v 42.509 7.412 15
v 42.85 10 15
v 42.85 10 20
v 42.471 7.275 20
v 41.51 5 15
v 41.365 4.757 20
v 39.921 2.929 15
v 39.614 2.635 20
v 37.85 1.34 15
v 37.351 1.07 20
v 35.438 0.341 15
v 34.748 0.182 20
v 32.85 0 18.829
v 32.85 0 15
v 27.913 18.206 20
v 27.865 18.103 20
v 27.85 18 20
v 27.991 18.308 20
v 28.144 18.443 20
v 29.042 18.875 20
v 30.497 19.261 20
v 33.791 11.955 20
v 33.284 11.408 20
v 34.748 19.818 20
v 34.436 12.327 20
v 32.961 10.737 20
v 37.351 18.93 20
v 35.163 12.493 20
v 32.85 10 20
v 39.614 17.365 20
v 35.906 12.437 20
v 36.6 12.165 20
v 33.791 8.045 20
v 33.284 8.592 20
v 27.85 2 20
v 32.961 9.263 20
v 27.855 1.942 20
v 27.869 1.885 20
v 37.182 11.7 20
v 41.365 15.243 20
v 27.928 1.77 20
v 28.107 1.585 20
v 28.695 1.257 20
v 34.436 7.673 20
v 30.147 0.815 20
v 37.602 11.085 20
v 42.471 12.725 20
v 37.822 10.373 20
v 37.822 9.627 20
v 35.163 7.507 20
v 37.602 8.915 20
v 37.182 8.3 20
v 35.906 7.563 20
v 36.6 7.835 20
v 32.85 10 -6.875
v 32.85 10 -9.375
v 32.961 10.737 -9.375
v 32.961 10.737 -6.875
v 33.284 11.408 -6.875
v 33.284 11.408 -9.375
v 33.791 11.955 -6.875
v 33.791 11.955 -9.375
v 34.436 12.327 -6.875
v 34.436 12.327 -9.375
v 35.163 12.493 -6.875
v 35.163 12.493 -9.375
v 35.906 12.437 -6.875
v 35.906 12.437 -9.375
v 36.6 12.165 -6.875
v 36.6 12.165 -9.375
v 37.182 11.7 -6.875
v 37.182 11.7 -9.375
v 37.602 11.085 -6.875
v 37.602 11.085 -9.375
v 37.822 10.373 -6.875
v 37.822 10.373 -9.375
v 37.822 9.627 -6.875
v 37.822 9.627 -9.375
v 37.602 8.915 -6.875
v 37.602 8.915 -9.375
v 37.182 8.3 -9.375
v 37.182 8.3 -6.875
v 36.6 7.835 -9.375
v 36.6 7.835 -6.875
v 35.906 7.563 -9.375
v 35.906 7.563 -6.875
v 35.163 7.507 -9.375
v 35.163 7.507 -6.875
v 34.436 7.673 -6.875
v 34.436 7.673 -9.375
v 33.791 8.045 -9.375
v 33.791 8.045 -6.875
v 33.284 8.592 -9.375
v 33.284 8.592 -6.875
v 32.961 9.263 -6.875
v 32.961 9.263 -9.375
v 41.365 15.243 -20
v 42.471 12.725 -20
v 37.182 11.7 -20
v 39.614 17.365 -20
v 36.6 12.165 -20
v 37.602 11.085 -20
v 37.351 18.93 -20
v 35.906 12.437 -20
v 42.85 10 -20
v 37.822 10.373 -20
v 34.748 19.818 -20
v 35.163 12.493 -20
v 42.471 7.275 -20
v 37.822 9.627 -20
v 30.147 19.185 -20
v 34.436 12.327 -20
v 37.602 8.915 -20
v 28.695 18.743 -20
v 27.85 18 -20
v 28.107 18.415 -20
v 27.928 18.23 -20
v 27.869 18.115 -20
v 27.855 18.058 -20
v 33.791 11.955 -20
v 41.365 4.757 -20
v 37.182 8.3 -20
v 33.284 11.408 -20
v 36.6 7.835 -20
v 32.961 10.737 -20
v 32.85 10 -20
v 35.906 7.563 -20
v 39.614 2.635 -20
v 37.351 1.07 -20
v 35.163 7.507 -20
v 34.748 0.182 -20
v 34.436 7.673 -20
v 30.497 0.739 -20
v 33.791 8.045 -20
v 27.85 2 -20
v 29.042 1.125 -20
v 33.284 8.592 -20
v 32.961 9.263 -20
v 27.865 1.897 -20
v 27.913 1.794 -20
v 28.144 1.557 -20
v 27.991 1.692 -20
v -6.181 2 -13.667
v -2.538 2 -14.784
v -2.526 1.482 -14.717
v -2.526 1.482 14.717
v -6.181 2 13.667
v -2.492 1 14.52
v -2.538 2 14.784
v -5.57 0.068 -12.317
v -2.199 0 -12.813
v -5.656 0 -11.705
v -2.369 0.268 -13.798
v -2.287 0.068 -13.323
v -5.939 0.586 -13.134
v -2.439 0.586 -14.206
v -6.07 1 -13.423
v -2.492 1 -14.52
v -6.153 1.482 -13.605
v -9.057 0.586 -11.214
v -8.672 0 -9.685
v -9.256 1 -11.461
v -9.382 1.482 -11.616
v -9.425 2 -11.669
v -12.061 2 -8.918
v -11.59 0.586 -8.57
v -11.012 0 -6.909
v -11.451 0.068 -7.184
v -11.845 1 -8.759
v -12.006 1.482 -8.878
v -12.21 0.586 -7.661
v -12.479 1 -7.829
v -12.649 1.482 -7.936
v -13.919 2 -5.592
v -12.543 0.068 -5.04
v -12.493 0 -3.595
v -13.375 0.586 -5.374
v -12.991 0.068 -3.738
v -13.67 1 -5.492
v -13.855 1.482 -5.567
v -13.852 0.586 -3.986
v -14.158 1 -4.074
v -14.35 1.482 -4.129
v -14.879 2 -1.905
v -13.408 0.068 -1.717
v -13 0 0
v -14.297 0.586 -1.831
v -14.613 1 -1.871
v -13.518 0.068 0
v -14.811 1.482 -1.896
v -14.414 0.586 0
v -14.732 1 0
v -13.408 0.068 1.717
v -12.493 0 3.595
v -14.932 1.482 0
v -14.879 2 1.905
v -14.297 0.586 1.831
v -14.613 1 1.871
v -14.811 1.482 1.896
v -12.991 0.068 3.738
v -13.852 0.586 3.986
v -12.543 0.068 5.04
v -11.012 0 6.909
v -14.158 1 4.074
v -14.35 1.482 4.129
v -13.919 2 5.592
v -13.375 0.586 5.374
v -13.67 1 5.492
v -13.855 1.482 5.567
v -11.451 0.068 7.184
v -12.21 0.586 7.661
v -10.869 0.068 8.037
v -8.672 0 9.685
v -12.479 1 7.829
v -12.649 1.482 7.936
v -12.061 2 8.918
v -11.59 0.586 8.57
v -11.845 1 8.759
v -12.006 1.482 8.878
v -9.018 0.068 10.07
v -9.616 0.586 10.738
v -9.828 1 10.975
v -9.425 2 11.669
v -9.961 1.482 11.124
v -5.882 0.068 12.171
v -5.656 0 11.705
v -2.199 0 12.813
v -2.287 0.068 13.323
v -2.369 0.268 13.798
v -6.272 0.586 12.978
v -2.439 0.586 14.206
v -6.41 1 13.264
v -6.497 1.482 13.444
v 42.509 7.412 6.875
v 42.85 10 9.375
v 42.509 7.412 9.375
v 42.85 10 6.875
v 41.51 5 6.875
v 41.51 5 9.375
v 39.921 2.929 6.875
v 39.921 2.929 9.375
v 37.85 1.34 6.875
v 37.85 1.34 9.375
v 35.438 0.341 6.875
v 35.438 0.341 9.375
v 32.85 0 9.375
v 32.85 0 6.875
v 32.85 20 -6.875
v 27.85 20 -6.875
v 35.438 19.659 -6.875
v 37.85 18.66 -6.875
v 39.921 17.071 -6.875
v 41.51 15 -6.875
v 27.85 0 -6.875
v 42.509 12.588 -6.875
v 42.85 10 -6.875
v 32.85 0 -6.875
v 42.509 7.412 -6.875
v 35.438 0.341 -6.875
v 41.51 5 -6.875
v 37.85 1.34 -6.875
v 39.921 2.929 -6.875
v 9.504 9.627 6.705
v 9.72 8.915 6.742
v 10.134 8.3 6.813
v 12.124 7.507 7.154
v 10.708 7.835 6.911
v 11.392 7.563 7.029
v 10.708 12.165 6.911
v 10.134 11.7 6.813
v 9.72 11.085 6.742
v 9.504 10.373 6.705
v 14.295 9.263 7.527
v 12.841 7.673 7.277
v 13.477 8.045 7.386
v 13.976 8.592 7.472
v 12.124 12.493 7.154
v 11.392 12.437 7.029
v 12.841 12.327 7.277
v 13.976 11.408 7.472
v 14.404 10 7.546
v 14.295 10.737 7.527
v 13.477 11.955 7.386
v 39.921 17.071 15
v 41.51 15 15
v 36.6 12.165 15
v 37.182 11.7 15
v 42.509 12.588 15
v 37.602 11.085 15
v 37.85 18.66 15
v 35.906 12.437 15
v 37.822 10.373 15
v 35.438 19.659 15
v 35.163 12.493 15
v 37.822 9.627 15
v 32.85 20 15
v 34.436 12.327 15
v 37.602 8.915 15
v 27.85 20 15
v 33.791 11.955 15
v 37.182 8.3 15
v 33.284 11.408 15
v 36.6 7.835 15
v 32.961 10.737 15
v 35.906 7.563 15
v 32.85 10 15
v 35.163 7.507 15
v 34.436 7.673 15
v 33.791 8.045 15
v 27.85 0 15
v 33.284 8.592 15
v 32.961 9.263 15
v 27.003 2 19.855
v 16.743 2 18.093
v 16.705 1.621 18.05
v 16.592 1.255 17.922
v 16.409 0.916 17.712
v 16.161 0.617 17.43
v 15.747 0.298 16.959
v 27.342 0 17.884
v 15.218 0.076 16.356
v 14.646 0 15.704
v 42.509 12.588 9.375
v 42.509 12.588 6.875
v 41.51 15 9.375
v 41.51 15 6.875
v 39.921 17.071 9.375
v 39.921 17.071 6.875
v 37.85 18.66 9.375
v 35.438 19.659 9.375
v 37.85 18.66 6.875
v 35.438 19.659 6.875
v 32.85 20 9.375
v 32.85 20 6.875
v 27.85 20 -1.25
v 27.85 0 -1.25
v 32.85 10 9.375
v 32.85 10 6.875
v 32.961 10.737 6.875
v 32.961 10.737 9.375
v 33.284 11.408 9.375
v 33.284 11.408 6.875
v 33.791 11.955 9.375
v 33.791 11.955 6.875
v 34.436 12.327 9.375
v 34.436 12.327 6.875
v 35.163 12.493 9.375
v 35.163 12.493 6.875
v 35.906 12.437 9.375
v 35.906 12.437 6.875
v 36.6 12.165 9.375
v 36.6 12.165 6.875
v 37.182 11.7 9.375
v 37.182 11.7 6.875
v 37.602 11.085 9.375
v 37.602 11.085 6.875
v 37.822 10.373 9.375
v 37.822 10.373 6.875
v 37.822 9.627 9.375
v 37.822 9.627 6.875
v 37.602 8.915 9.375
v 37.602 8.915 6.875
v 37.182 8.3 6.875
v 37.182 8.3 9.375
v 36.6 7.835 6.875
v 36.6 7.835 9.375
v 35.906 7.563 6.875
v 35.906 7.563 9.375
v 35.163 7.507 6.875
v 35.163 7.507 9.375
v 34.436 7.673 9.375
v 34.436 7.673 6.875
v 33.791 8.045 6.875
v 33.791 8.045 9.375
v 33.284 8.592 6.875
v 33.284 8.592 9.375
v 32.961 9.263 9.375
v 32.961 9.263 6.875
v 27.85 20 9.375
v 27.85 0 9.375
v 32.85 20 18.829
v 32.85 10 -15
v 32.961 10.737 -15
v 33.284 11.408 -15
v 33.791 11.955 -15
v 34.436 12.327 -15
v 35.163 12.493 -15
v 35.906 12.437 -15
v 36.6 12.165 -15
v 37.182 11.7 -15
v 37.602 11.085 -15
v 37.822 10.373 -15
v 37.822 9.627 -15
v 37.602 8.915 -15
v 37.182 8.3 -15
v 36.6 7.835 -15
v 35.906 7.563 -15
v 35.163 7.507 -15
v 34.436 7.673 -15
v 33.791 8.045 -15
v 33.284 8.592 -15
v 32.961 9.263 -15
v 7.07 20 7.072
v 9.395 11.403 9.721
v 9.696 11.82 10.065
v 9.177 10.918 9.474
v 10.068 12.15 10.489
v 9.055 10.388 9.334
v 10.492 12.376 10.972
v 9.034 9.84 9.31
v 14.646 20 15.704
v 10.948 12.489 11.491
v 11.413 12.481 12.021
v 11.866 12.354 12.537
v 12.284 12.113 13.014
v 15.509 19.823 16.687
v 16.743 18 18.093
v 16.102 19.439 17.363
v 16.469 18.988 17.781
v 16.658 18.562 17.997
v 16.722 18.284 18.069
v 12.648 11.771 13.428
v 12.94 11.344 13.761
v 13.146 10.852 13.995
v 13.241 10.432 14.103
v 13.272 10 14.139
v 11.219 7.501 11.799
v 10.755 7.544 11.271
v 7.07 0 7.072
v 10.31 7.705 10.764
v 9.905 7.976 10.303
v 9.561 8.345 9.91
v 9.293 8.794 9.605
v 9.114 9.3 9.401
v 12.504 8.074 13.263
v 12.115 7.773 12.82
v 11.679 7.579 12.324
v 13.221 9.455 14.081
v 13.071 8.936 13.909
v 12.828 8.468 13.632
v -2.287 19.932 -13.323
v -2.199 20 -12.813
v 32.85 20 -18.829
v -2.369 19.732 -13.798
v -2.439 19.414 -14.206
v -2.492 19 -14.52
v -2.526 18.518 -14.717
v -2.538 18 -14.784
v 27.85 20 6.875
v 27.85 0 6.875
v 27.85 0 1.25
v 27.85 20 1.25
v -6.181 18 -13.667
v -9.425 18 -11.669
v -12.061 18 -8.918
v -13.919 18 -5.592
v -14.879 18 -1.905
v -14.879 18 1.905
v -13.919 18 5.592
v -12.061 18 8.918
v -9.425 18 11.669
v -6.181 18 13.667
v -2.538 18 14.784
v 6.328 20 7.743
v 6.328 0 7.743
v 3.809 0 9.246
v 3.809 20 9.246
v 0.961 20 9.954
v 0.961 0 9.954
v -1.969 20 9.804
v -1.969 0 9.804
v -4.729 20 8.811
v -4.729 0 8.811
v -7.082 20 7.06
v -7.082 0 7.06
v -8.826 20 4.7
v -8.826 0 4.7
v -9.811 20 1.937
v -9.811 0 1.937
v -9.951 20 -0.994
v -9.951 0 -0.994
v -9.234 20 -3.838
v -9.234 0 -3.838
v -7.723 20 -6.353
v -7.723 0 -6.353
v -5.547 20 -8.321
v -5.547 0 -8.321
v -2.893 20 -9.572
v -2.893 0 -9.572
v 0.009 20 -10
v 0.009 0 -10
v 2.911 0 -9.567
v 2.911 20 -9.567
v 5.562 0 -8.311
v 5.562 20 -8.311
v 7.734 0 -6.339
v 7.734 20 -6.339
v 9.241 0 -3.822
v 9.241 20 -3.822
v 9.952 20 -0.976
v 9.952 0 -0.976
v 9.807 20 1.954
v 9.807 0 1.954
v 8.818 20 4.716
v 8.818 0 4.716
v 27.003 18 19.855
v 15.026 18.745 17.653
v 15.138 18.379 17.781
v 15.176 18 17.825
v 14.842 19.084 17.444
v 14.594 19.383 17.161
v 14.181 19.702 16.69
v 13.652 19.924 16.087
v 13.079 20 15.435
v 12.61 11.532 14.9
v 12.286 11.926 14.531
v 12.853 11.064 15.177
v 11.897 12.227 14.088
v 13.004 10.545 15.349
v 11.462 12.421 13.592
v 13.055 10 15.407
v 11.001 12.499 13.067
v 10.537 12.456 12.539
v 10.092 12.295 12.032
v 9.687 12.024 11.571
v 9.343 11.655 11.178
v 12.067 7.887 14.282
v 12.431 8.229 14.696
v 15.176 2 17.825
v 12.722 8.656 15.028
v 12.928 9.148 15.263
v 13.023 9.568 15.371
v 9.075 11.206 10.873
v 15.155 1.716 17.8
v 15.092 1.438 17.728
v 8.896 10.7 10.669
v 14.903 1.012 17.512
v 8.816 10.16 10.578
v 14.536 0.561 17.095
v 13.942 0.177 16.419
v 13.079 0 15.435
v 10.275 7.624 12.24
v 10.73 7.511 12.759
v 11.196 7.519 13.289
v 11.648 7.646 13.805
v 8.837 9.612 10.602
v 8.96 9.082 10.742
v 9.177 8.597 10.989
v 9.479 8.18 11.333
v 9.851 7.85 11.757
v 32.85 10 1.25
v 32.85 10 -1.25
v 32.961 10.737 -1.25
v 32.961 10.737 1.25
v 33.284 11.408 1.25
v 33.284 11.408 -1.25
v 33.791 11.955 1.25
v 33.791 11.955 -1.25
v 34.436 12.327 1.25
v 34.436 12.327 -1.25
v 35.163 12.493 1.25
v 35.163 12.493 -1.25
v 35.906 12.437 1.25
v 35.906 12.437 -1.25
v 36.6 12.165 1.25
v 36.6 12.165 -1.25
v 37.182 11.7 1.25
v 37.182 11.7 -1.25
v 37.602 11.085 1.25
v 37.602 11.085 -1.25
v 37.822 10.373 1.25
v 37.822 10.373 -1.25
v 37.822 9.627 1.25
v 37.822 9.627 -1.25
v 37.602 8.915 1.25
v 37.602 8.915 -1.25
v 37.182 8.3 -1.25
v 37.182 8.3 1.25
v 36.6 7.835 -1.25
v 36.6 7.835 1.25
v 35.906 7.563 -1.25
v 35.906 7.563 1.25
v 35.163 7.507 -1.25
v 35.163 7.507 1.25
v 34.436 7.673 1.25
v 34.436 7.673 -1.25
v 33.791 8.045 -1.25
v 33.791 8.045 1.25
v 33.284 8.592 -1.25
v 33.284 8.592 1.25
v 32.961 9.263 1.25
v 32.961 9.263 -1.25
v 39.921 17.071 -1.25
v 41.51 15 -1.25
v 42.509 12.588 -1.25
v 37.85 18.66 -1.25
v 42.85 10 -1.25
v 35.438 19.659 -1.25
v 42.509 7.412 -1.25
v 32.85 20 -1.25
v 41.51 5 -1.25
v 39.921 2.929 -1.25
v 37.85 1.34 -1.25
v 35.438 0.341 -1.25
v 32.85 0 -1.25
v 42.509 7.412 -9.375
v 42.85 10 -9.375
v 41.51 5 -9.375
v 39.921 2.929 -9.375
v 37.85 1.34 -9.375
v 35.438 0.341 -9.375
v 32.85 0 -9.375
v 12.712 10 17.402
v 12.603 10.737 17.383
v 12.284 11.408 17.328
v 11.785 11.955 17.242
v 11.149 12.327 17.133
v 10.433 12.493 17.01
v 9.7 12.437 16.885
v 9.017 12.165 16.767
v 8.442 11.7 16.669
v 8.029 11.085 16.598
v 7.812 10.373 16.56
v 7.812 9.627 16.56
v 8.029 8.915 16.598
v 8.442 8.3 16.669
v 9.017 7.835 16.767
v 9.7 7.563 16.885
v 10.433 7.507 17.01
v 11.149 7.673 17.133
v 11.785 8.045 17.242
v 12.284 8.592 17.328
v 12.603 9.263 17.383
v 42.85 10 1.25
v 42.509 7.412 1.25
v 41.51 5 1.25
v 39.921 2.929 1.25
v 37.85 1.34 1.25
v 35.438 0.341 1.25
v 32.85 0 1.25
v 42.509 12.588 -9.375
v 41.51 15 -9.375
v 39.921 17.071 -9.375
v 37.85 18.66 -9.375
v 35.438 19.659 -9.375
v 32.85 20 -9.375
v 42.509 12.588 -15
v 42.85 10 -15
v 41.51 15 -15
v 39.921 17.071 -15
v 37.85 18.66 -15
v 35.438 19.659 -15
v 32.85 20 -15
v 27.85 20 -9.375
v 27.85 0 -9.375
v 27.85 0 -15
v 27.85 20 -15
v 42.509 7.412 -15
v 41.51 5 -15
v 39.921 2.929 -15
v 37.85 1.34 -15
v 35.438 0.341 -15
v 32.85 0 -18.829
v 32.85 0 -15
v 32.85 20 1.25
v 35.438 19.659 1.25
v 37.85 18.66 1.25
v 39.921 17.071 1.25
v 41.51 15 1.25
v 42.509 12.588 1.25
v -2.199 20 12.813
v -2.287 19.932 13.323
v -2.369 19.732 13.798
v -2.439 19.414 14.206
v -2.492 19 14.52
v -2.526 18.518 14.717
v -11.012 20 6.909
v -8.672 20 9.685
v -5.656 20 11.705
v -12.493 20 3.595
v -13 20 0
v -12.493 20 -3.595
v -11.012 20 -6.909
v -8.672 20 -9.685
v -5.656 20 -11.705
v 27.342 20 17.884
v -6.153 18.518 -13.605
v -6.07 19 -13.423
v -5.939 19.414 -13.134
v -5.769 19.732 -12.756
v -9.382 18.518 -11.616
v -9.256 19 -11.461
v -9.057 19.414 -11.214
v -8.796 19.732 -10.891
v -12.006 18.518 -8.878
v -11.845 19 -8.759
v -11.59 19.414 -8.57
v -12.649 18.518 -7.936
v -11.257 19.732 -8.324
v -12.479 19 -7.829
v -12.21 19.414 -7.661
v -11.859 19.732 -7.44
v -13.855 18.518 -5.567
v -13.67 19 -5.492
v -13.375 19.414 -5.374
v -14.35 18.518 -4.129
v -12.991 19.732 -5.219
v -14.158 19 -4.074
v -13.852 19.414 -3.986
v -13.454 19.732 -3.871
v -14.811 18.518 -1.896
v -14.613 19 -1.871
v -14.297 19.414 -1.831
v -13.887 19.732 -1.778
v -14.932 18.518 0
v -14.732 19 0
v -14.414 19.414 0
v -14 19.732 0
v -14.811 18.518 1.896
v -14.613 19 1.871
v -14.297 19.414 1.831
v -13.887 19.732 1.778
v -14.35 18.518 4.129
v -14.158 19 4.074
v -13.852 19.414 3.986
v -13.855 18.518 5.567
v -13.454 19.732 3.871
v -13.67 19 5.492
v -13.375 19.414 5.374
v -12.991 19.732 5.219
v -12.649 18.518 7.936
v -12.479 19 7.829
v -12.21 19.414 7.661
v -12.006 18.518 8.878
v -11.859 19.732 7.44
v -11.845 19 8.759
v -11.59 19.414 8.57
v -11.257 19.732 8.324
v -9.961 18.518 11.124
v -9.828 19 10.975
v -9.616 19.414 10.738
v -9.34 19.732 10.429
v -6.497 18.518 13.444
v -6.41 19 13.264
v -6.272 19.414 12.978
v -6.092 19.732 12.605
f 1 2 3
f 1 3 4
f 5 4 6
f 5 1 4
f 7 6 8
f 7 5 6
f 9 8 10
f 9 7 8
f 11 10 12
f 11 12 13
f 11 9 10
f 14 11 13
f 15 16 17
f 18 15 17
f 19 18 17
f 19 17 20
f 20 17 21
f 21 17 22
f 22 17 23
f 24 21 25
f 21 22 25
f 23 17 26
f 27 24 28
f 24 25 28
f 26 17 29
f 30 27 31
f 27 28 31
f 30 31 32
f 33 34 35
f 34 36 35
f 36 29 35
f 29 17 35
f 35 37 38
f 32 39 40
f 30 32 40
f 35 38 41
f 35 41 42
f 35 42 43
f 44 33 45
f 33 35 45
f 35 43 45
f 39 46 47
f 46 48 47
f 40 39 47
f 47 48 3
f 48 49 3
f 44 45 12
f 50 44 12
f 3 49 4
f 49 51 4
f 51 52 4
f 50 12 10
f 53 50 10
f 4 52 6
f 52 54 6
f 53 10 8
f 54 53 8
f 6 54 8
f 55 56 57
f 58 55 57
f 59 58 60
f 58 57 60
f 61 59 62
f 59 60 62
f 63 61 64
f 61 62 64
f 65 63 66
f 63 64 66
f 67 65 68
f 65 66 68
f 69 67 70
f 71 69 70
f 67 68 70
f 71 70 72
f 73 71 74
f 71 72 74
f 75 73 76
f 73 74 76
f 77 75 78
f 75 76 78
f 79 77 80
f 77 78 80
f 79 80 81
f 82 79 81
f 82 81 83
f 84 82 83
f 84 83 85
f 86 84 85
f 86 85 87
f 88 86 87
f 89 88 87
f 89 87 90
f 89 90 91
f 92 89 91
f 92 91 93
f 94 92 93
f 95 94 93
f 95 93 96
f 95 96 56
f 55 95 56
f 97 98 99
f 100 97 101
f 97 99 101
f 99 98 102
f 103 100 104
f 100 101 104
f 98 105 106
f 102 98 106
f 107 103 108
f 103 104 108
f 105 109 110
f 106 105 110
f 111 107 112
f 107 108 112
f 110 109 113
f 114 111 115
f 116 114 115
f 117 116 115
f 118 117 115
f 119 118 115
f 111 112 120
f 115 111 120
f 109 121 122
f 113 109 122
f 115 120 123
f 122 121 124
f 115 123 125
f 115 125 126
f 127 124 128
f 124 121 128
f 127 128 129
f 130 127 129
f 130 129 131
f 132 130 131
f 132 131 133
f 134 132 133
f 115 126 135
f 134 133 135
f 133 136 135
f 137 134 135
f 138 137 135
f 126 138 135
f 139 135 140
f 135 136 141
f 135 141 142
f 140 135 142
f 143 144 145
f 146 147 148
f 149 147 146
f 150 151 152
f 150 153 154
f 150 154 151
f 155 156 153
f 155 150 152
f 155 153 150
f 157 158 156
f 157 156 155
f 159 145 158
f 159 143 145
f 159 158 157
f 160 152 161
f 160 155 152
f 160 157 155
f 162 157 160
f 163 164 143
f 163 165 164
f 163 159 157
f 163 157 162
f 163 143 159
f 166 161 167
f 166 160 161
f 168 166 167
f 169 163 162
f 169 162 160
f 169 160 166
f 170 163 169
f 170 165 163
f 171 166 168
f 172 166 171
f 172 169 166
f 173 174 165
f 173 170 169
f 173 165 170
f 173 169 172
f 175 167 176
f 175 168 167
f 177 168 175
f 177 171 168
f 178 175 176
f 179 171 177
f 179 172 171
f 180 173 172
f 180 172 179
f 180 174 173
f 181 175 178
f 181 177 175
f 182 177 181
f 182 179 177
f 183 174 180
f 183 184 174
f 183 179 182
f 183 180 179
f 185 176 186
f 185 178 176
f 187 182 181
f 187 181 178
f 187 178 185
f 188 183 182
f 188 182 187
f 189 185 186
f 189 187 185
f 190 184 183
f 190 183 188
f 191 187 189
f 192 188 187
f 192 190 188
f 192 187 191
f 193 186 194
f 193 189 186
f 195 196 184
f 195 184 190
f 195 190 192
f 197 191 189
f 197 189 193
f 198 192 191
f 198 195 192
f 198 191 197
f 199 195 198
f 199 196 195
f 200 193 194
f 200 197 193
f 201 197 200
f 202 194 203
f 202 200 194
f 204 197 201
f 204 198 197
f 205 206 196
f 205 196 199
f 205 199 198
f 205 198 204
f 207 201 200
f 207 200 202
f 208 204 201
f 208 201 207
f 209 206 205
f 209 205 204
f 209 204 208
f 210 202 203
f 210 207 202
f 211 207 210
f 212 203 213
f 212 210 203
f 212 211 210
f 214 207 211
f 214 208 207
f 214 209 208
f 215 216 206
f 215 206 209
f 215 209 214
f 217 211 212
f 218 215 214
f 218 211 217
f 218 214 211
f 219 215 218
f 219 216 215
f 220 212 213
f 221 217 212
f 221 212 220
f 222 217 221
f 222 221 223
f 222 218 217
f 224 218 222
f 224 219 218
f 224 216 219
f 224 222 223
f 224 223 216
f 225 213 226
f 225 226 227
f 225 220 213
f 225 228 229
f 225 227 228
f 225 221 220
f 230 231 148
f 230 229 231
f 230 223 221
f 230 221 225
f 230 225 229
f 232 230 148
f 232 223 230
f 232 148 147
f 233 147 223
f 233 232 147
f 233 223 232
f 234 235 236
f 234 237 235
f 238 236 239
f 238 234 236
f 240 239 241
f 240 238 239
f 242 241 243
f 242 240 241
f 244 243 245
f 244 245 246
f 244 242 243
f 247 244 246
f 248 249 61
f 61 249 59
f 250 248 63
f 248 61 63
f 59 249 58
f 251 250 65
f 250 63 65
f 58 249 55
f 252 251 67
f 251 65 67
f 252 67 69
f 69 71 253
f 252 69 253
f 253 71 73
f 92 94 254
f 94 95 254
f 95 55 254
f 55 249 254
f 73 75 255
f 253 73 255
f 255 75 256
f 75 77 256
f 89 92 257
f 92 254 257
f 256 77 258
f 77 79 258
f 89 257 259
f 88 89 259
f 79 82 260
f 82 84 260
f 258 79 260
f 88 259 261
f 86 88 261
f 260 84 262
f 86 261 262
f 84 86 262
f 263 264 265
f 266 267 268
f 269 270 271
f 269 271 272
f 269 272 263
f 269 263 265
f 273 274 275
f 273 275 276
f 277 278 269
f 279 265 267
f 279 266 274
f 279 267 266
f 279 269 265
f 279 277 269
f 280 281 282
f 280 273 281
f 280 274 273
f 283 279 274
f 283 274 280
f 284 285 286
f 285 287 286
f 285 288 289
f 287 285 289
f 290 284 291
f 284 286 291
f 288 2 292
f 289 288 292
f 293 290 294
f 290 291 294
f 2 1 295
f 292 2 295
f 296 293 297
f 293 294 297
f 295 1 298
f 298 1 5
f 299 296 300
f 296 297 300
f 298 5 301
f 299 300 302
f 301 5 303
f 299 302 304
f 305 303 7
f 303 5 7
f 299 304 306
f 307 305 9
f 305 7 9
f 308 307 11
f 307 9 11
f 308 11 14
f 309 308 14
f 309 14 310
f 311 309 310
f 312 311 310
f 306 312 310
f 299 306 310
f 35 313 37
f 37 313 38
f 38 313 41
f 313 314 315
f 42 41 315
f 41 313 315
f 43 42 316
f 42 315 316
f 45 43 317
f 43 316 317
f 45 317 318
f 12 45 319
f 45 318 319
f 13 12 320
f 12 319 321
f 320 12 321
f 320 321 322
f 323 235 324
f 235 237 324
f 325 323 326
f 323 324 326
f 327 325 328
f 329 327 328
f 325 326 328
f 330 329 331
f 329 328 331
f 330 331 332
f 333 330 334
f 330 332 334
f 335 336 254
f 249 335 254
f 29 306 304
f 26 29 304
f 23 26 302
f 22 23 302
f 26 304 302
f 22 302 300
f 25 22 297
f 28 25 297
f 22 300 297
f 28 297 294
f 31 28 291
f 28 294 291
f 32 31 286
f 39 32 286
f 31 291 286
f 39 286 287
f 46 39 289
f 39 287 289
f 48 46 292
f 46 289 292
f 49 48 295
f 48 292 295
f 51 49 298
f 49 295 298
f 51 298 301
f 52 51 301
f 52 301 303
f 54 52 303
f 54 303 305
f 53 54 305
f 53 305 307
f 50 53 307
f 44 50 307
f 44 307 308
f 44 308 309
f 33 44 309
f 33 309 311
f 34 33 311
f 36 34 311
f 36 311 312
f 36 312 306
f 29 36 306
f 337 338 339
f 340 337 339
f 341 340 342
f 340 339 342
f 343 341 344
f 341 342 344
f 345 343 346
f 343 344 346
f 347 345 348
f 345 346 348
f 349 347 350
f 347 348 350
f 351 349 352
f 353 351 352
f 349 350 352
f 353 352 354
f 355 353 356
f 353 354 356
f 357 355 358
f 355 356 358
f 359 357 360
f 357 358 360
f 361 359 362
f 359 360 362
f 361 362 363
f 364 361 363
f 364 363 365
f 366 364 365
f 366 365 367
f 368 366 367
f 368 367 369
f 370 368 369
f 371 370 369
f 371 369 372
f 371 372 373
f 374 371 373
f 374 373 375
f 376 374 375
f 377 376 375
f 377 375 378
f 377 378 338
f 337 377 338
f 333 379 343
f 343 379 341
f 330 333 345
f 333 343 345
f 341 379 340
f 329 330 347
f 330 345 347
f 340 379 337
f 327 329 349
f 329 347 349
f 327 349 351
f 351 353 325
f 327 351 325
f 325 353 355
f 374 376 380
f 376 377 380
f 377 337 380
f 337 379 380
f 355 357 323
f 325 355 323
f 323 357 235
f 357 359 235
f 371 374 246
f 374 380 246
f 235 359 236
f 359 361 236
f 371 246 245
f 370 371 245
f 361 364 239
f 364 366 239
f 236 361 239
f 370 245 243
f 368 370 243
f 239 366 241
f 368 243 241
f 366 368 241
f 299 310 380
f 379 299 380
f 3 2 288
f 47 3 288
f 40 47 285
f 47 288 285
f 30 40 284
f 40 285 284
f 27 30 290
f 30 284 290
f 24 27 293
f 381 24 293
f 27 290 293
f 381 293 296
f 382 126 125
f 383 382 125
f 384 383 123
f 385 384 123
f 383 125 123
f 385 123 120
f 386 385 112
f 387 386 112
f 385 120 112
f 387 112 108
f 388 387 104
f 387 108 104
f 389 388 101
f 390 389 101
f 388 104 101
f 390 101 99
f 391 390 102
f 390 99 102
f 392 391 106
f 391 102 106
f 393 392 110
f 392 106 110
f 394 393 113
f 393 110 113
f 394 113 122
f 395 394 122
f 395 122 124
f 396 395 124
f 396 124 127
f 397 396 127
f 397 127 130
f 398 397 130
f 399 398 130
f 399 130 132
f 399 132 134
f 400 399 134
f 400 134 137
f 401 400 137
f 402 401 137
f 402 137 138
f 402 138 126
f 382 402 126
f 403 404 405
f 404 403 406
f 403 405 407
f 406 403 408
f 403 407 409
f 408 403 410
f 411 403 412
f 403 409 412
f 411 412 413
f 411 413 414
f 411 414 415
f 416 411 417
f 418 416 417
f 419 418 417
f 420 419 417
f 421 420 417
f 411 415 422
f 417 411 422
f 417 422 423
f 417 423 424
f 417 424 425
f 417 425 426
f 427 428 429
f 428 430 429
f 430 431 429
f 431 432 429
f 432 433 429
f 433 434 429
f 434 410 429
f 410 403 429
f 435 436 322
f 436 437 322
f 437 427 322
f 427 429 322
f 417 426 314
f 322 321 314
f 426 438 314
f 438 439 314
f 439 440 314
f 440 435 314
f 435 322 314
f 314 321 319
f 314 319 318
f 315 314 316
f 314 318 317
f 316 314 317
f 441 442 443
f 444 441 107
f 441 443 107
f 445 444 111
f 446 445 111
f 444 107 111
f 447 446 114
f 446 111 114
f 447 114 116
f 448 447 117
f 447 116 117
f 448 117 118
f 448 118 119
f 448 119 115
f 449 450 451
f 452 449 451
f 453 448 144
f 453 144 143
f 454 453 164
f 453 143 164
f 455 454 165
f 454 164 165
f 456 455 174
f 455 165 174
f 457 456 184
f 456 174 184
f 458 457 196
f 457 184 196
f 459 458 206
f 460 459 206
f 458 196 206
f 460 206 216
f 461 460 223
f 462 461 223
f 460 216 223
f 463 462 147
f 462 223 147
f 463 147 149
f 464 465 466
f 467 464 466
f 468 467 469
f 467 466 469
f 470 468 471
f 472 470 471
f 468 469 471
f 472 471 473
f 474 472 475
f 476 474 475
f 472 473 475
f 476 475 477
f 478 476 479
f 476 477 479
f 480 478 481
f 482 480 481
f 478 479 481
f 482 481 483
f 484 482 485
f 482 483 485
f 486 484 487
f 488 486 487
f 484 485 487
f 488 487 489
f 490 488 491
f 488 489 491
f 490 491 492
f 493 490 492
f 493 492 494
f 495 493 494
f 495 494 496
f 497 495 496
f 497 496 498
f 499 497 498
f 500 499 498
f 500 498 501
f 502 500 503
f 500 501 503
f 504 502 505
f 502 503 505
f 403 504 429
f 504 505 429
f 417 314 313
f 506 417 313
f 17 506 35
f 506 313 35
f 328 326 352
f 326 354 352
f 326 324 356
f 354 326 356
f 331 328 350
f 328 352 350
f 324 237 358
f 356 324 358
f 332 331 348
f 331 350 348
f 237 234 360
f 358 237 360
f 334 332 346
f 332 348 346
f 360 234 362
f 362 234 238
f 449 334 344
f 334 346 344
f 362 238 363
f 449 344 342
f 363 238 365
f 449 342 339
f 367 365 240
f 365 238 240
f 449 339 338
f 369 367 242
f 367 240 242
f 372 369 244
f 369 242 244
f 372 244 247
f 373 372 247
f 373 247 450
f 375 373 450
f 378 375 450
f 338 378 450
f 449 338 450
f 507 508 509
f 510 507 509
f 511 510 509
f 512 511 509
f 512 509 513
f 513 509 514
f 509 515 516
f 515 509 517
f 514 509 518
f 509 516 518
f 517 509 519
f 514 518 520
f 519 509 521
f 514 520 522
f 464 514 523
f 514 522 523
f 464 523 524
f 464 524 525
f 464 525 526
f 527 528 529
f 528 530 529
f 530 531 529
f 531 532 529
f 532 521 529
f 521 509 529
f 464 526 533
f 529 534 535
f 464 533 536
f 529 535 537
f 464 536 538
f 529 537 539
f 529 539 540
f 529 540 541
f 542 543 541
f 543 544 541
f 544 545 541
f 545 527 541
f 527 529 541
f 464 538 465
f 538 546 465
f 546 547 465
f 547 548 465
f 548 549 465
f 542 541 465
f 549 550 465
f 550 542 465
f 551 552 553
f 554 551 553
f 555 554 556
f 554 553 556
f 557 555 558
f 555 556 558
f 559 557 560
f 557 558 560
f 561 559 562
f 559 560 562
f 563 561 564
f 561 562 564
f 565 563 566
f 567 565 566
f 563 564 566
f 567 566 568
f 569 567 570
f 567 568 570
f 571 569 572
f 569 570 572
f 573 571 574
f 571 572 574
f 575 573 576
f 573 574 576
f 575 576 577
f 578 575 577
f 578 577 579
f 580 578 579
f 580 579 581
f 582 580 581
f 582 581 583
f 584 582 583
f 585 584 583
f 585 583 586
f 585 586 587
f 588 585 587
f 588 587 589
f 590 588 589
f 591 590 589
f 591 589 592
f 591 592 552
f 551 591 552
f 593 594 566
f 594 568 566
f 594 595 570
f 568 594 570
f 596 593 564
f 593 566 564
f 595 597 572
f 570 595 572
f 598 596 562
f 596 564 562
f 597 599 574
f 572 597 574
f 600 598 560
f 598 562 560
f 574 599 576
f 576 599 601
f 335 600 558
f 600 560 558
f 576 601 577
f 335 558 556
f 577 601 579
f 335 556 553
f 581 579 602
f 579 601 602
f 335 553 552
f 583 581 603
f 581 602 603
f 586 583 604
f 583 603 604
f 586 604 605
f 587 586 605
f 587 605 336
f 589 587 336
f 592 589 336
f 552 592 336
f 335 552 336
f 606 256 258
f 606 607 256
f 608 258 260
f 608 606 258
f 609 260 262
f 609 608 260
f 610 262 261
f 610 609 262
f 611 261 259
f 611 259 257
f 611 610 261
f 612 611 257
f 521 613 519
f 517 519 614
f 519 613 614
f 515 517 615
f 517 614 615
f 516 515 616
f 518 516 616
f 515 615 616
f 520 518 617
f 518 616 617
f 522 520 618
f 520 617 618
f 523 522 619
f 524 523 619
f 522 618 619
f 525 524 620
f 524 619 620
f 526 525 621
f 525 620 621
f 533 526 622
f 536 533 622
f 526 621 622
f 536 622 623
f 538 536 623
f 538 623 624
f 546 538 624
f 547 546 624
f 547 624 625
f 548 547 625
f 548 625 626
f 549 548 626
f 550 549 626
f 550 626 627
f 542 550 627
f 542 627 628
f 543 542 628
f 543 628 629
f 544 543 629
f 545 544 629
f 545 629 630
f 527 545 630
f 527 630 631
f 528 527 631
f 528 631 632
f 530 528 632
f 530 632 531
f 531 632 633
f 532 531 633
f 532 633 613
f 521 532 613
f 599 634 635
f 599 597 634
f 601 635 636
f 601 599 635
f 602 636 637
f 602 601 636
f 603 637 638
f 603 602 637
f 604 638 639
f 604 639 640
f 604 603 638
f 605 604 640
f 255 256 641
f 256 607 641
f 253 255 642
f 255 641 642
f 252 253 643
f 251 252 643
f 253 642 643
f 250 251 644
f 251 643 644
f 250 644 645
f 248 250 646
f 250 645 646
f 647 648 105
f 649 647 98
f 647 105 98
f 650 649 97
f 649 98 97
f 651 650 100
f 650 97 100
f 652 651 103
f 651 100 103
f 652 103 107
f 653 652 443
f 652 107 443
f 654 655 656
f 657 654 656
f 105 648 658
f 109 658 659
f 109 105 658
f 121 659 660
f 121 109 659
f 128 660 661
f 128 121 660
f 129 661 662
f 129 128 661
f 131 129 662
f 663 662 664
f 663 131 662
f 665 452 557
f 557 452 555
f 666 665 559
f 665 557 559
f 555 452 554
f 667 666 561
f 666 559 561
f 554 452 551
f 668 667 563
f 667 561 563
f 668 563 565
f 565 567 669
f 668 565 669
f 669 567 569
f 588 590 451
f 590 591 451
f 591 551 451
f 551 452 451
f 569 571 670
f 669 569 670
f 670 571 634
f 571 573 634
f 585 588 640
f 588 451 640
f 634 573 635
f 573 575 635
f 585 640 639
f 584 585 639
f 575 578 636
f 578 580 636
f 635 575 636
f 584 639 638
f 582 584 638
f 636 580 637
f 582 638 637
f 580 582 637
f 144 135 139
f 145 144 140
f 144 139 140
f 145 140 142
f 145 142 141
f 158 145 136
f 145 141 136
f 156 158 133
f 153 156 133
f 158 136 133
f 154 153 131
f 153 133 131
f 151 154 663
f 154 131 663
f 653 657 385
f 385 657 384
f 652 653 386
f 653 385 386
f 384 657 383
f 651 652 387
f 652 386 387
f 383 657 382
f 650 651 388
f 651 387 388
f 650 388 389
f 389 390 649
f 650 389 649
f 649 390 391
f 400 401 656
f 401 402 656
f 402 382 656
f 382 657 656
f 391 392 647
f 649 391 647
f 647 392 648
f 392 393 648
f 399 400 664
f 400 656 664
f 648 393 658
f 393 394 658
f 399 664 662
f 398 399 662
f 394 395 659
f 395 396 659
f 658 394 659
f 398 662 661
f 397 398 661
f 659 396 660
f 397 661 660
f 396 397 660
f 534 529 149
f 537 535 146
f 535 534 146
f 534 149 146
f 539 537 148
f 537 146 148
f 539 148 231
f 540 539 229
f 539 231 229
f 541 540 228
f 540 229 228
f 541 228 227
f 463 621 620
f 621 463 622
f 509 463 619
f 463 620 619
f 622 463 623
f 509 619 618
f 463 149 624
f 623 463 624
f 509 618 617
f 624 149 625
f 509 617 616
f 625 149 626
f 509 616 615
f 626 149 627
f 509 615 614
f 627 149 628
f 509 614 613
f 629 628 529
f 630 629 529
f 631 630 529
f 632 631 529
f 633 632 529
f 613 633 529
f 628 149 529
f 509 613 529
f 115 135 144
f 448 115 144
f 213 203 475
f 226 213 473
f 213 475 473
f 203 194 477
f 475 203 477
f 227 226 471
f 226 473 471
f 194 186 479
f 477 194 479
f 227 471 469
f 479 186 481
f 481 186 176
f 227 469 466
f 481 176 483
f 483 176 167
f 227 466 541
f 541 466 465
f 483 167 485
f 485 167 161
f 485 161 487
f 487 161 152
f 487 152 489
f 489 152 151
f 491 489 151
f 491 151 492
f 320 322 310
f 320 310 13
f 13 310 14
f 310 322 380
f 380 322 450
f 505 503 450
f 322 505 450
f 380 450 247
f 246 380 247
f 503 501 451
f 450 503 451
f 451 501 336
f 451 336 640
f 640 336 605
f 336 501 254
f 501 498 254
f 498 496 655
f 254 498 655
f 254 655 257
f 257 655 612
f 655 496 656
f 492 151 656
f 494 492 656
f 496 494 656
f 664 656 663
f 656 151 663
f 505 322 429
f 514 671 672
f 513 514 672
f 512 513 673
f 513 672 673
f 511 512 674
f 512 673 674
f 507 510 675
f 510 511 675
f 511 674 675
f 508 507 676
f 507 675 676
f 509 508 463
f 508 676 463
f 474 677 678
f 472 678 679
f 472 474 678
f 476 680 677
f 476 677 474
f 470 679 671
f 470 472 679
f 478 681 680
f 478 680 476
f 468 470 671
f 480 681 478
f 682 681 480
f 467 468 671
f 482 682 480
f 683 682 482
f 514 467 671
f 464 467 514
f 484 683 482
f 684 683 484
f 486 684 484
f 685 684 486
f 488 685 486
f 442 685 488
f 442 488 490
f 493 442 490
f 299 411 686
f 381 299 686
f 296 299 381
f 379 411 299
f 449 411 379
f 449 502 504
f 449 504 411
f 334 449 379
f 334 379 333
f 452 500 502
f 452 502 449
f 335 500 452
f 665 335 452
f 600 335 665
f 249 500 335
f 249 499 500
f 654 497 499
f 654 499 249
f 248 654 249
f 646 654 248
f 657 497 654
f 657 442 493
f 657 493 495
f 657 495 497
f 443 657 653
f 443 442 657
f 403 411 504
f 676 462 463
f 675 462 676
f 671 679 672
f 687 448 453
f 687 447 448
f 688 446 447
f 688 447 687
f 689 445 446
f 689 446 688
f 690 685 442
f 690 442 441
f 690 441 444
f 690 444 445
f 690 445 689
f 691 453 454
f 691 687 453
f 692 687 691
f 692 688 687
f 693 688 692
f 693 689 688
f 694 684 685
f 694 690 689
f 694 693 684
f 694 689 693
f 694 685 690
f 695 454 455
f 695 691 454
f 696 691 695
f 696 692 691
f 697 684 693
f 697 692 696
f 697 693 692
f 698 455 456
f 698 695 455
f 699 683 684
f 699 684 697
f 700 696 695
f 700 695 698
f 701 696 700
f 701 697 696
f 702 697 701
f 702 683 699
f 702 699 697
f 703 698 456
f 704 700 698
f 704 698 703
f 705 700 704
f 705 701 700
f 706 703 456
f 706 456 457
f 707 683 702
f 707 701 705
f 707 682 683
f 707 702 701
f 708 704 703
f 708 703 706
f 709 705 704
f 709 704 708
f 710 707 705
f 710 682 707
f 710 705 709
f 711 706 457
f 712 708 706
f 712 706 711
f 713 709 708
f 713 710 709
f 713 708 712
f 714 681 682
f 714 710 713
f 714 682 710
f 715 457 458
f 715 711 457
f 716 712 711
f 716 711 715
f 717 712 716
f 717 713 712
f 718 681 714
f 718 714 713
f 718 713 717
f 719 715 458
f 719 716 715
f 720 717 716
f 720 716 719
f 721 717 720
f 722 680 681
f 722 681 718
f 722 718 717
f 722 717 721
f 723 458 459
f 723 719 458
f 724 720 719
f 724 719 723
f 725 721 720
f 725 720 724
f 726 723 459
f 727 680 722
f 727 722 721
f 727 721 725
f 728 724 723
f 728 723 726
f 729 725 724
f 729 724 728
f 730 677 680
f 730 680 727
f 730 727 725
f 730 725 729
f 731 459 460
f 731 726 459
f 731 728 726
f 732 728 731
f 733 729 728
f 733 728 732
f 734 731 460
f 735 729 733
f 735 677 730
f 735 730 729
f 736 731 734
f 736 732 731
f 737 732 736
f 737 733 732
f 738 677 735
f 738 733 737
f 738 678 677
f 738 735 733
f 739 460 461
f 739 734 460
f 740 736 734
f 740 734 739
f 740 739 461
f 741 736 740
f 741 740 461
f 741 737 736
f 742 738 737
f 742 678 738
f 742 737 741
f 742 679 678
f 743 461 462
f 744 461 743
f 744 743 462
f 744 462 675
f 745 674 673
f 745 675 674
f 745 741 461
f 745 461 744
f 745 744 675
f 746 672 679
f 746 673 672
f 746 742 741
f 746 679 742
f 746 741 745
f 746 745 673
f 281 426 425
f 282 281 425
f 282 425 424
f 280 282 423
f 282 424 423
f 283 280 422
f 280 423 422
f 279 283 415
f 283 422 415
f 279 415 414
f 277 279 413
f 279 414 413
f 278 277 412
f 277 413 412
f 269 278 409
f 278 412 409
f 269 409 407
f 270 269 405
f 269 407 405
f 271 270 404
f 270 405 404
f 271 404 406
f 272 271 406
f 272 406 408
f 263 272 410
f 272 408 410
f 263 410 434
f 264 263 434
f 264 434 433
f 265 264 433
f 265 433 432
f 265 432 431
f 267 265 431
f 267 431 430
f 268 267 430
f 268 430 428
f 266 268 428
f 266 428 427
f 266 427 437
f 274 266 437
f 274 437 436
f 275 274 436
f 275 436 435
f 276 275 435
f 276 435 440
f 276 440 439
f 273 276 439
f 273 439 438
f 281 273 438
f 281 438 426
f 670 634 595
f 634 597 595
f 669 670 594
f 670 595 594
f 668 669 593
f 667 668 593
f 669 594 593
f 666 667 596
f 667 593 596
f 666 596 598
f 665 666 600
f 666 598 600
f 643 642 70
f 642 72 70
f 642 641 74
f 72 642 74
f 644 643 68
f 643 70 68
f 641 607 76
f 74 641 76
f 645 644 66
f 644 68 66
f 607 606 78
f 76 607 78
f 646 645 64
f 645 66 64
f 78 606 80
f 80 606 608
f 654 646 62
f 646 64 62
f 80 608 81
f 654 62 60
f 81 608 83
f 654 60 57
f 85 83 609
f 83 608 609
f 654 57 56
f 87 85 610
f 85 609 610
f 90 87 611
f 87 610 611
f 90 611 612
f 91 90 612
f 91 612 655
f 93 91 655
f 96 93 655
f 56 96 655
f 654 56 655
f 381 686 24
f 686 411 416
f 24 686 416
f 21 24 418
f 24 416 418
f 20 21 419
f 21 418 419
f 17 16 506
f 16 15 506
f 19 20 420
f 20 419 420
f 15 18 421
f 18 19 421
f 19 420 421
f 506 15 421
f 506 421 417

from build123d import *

# Parameters (mm, degrees)
BOSS_EXTRUDE1_DEPTH = 20
FILLET1_R           = 10
SKETCH2_R           = 2.5
CUT_EXTRUDE1_DEPTH  = 40
FILLET2_R           = 2
SKETCH3_R           = 2.5
CUT_EXTRUDE2_DEPTH  = 10


# Some blends are built 0.0001 mm under size
with BuildPart() as part:
    # Sketch1 → Boss-Extrude1 (new body)
    with BuildSketch(Plane(origin=(0, 0, 0), x_dir=(1, 0, 0), z_dir=(0, 1, 0))):
        with BuildLine():
            Line((27.849705815, 9.375), (27.849705815, 15))
            Line((27.849705815, 15), (42.849705815, 15))
            Line((42.849705815, 15), (42.849705815, 20))
            Line((42.849705815, 20), (27.849705815, 20))
            Line((27.849705815, 20), (-2.537743238, 14.78377013))
            ThreePointArc((-2.537743238, 14.78377013), (-15, 0), (-2.537743238, -14.78377013))
            Line((-2.537743238, -14.78377013), (15.176440556, -17.824540498))
            Line((15.176440556, -17.824540498), (6.327966589, -7.743180151))
            ThreePointArc((6.327966589, -7.743180151), (-6.707251498, 7.417059885), (7.069754095, -7.072381285))
            Line((7.069754095, -7.072381285), (16.743020962, -18.093455585))
            Line((16.743020962, -18.093455585), (27.849705815, -20))
            Line((27.849705815, -20), (42.849705815, -20))
            Line((42.849705815, -20), (42.849705815, -15))
            Line((42.849705815, -15), (27.849705815, -15))
            Line((27.849705815, -15), (27.849705815, -9.375))
            Line((27.849705815, -9.375), (42.849705815, -9.375))
            Line((42.849705815, -9.375), (42.849705815, -6.875))
            Line((42.849705815, -6.875), (27.849705815, -6.875))
            Line((27.849705815, -6.875), (27.849705815, -1.25))
            Line((27.849705815, -1.25), (42.849705815, -1.25))
            Line((42.849705815, -1.25), (42.849705815, 1.25))
            Line((42.849705815, 1.25), (27.849705815, 1.25))
            Line((27.849705815, 1.25), (27.849705815, 6.875))
            Line((27.849705815, 6.875), (42.849705815, 6.875))
            Line((42.849705815, 6.875), (42.849705815, 9.375))
            Line((42.849705815, 9.375), (27.849705815, 9.375))
        make_face()
    extrude(amount=BOSS_EXTRUDE1_DEPTH)

    # Fillet1
    fillet1_edges = [part.edges().sort_by_distance(p)[0] for p in [
        (42.849705815, 0, 17.5),
        (42.849705815, 0, 8.125),
        (42.849705815, 0, 0),
        (42.849705815, 0, -8.125),
        (42.849705815, 0, -17.5),
        (42.849705815, 20, -17.5),
        (42.849705815, 20, -8.125),
        (42.849705815, 20, 0),
        (42.849705815, 20, 8.125),
        (42.849705815, 20, 17.5),
    ]]
    fillet(fillet1_edges, radius=FILLET1_R - 0.0001)  # a hair under: the kernel refuses the full size

    # Sketch2 → Cut-Extrude1 (cut)
    with BuildSketch(Plane(origin=(0, 0, -20), x_dir=(-1, 0, 0), z_dir=(0, 0, -1))):
        with Locations((-35.349705815, 10)):
            Circle(SKETCH2_R)
    extrude(amount=-CUT_EXTRUDE1_DEPTH, mode=Mode.SUBTRACT)

    # Fillet2
    # the kernel refuses this fillet: 2 mm, written as the material it takes off along each edge
    with BuildSketch(Plane(origin=(39.676721919, 0, -22.03019459), x_dir=(0.16918288251037936, 0, 0.9855846753402162), z_dir=(-0.9855846753402161, 0, 0.16918288251037933))) as fillet2_piece_1:
        with BuildLine():
            CenterArc((FILLET2_R, FILLET2_R), FILLET2_R, 180, 90)
            Line((0, FILLET2_R), (-FILLET2_R * 0.02, FILLET2_R))
            Line((-FILLET2_R * 0.02, FILLET2_R), (-FILLET2_R * 0.02, -FILLET2_R * 0.02))
            Line((-FILLET2_R * 0.02, -FILLET2_R * 0.02), (FILLET2_R, -FILLET2_R * 0.02))
            Line((FILLET2_R, -FILLET2_R * 0.02), (FILLET2_R, 0))
        make_face()
    extrude(amount=42.831900914, mode=Mode.SUBTRACT)
    with BuildSketch(Plane(origin=(-2.537743238, 0, 14.78377013), x_dir=(0.16918288251037944, 0, -0.9855846753402161), z_dir=(0.9855846753402161, 0, 0.16918288251037944))) as fillet2_piece_2:
        with BuildLine():
            CenterArc((FILLET2_R, FILLET2_R), FILLET2_R, 180, 90)
            Line((0, FILLET2_R), (-FILLET2_R * 0.02, FILLET2_R))
            Line((-FILLET2_R * 0.02, FILLET2_R), (-FILLET2_R * 0.02, -FILLET2_R * 0.02))
            Line((-FILLET2_R * 0.02, -FILLET2_R * 0.02), (FILLET2_R, -FILLET2_R * 0.02))
            Line((FILLET2_R, -FILLET2_R * 0.02), (FILLET2_R, 0))
        make_face()
    extrude(amount=29.973274379, mode=Mode.SUBTRACT)
    with BuildSketch(Plane(origin=(39.676721919, 20, -22.03019459), x_dir=(0.16918288251037936, 0, 0.9855846753402162), z_dir=(-0.9855846753402161, 0, 0.16918288251037933))) as fillet2_piece_3:
        with BuildLine():
            CenterArc((FILLET2_R, -FILLET2_R), FILLET2_R, 90, 90)
            Line((0, -FILLET2_R), (-FILLET2_R * 0.02, -FILLET2_R))
            Line((-FILLET2_R * 0.02, -FILLET2_R), (-FILLET2_R * 0.02, FILLET2_R * 0.02))
            Line((-FILLET2_R * 0.02, FILLET2_R * 0.02), (FILLET2_R, FILLET2_R * 0.02))
            Line((FILLET2_R, FILLET2_R * 0.02), (FILLET2_R, 0))
        make_face()
    extrude(amount=42.831900914, mode=Mode.SUBTRACT)
    with BuildSketch(Plane(origin=(-2.537743238, 20, 14.78377013), x_dir=(0.16918288251037944, 0, -0.9855846753402161), z_dir=(0.9855846753402161, 0, 0.16918288251037944))) as fillet2_piece_4:
        with BuildLine():
            CenterArc((FILLET2_R, -FILLET2_R), FILLET2_R, 90, 90)
            Line((0, -FILLET2_R), (-FILLET2_R * 0.02, -FILLET2_R))
            Line((-FILLET2_R * 0.02, -FILLET2_R), (-FILLET2_R * 0.02, FILLET2_R * 0.02))
            Line((-FILLET2_R * 0.02, FILLET2_R * 0.02), (FILLET2_R, FILLET2_R * 0.02))
            Line((FILLET2_R, FILLET2_R * 0.02), (FILLET2_R, 0))
        make_face()
    extrude(amount=29.973274379, mode=Mode.SUBTRACT)
    with BuildSketch(Plane(origin=(4.916004858, 0, 16.063260995), x_dir=(0.16918288251037944, 0, -0.9855846753402161), z_dir=(0.9855846753402161, 0, 0.16918288251037944))) as fillet2_piece_5:
        with BuildLine():
            CenterArc((FILLET2_R, FILLET2_R), FILLET2_R, 180, 90)
            Line((0, FILLET2_R), (-FILLET2_R * 0.02, FILLET2_R))
            Line((-FILLET2_R * 0.02, FILLET2_R), (-FILLET2_R * 0.02, -FILLET2_R * 0.02))
            Line((-FILLET2_R * 0.02, -FILLET2_R * 0.02), (FILLET2_R, -FILLET2_R * 0.02))
            Line((FILLET2_R, -FILLET2_R * 0.02), (FILLET2_R, 0))
        make_face()
    extrude(amount=35.269133064, mode=Mode.SUBTRACT)
    with BuildSketch(Plane(origin=(4.916004858, 20, 16.063260995), x_dir=(0.16918288251037944, 0, -0.9855846753402161), z_dir=(0.9855846753402161, 0, 0.16918288251037944))) as fillet2_piece_6:
        with BuildLine():
            CenterArc((FILLET2_R, -FILLET2_R), FILLET2_R, 90, 90)
            Line((0, -FILLET2_R), (-FILLET2_R * 0.02, -FILLET2_R))
            Line((-FILLET2_R * 0.02, -FILLET2_R), (-FILLET2_R * 0.02, FILLET2_R * 0.02))
            Line((-FILLET2_R * 0.02, FILLET2_R * 0.02), (FILLET2_R, FILLET2_R * 0.02))
            Line((FILLET2_R, FILLET2_R * 0.02), (FILLET2_R, 0))
        make_face()
    extrude(amount=35.269133064, mode=Mode.SUBTRACT)
    with BuildSketch(Plane(origin=(0, 0, 0), x_dir=(-0.16918288251037905, 0, -0.9855846753402162), z_dir=(0.9855846753402162, 0, -0.16918288251037905))) as fillet2_piece_7:
        with BuildLine():
            CenterArc((15 - FILLET2_R, FILLET2_R), FILLET2_R, 270, 90)
            Line((15, FILLET2_R), (15 + FILLET2_R * 0.02, FILLET2_R))
            Line((15 + FILLET2_R * 0.02, FILLET2_R), (15 + FILLET2_R * 0.02, -FILLET2_R * 0.02))
            Line((15 + FILLET2_R * 0.02, -FILLET2_R * 0.02), (15 - FILLET2_R, -FILLET2_R * 0.02))
            Line((15 - FILLET2_R, -FILLET2_R * 0.02), (15 - FILLET2_R, 0))
        make_face()
    revolve(axis=Axis((0, 0, 0), (0, 1, 0)), revolution_arc=160.519372943, mode=Mode.SUBTRACT)
    with BuildSketch(Plane(origin=(0, 20, 0), x_dir=(-0.16918288251037905, 0, -0.9855846753402162), z_dir=(0.9855846753402162, 0, -0.16918288251037905))) as fillet2_piece_8:
        with BuildLine():
            CenterArc((15 - FILLET2_R, -FILLET2_R), FILLET2_R, 0, 90)
            Line((15, -FILLET2_R), (15 + FILLET2_R * 0.02, -FILLET2_R))
            Line((15 + FILLET2_R * 0.02, -FILLET2_R), (15 + FILLET2_R * 0.02, FILLET2_R * 0.02))
            Line((15 + FILLET2_R * 0.02, FILLET2_R * 0.02), (15 - FILLET2_R, FILLET2_R * 0.02))
            Line((15 - FILLET2_R, FILLET2_R * 0.02), (15 - FILLET2_R, 0))
        make_face()
    revolve(axis=Axis((0, 20, 0), (0, 1, 0)), revolution_arc=160.519372943, mode=Mode.SUBTRACT)

    # Sketch3 → Cut-Extrude2 (cut)
    with BuildSketch(Plane(origin=(-2.537743238, 0, 14.78377013), x_dir=(0.9855846753402161, 0, 0.16918288251037955), z_dir=(-0.16918288251037955, 0, 0.9855846753402161))):
        with Locations((12.973274379, 10)):
            Circle(SKETCH3_R)
    extrude(amount=-CUT_EXTRUDE2_DEPTH, mode=Mode.SUBTRACT)


solid = part.part
